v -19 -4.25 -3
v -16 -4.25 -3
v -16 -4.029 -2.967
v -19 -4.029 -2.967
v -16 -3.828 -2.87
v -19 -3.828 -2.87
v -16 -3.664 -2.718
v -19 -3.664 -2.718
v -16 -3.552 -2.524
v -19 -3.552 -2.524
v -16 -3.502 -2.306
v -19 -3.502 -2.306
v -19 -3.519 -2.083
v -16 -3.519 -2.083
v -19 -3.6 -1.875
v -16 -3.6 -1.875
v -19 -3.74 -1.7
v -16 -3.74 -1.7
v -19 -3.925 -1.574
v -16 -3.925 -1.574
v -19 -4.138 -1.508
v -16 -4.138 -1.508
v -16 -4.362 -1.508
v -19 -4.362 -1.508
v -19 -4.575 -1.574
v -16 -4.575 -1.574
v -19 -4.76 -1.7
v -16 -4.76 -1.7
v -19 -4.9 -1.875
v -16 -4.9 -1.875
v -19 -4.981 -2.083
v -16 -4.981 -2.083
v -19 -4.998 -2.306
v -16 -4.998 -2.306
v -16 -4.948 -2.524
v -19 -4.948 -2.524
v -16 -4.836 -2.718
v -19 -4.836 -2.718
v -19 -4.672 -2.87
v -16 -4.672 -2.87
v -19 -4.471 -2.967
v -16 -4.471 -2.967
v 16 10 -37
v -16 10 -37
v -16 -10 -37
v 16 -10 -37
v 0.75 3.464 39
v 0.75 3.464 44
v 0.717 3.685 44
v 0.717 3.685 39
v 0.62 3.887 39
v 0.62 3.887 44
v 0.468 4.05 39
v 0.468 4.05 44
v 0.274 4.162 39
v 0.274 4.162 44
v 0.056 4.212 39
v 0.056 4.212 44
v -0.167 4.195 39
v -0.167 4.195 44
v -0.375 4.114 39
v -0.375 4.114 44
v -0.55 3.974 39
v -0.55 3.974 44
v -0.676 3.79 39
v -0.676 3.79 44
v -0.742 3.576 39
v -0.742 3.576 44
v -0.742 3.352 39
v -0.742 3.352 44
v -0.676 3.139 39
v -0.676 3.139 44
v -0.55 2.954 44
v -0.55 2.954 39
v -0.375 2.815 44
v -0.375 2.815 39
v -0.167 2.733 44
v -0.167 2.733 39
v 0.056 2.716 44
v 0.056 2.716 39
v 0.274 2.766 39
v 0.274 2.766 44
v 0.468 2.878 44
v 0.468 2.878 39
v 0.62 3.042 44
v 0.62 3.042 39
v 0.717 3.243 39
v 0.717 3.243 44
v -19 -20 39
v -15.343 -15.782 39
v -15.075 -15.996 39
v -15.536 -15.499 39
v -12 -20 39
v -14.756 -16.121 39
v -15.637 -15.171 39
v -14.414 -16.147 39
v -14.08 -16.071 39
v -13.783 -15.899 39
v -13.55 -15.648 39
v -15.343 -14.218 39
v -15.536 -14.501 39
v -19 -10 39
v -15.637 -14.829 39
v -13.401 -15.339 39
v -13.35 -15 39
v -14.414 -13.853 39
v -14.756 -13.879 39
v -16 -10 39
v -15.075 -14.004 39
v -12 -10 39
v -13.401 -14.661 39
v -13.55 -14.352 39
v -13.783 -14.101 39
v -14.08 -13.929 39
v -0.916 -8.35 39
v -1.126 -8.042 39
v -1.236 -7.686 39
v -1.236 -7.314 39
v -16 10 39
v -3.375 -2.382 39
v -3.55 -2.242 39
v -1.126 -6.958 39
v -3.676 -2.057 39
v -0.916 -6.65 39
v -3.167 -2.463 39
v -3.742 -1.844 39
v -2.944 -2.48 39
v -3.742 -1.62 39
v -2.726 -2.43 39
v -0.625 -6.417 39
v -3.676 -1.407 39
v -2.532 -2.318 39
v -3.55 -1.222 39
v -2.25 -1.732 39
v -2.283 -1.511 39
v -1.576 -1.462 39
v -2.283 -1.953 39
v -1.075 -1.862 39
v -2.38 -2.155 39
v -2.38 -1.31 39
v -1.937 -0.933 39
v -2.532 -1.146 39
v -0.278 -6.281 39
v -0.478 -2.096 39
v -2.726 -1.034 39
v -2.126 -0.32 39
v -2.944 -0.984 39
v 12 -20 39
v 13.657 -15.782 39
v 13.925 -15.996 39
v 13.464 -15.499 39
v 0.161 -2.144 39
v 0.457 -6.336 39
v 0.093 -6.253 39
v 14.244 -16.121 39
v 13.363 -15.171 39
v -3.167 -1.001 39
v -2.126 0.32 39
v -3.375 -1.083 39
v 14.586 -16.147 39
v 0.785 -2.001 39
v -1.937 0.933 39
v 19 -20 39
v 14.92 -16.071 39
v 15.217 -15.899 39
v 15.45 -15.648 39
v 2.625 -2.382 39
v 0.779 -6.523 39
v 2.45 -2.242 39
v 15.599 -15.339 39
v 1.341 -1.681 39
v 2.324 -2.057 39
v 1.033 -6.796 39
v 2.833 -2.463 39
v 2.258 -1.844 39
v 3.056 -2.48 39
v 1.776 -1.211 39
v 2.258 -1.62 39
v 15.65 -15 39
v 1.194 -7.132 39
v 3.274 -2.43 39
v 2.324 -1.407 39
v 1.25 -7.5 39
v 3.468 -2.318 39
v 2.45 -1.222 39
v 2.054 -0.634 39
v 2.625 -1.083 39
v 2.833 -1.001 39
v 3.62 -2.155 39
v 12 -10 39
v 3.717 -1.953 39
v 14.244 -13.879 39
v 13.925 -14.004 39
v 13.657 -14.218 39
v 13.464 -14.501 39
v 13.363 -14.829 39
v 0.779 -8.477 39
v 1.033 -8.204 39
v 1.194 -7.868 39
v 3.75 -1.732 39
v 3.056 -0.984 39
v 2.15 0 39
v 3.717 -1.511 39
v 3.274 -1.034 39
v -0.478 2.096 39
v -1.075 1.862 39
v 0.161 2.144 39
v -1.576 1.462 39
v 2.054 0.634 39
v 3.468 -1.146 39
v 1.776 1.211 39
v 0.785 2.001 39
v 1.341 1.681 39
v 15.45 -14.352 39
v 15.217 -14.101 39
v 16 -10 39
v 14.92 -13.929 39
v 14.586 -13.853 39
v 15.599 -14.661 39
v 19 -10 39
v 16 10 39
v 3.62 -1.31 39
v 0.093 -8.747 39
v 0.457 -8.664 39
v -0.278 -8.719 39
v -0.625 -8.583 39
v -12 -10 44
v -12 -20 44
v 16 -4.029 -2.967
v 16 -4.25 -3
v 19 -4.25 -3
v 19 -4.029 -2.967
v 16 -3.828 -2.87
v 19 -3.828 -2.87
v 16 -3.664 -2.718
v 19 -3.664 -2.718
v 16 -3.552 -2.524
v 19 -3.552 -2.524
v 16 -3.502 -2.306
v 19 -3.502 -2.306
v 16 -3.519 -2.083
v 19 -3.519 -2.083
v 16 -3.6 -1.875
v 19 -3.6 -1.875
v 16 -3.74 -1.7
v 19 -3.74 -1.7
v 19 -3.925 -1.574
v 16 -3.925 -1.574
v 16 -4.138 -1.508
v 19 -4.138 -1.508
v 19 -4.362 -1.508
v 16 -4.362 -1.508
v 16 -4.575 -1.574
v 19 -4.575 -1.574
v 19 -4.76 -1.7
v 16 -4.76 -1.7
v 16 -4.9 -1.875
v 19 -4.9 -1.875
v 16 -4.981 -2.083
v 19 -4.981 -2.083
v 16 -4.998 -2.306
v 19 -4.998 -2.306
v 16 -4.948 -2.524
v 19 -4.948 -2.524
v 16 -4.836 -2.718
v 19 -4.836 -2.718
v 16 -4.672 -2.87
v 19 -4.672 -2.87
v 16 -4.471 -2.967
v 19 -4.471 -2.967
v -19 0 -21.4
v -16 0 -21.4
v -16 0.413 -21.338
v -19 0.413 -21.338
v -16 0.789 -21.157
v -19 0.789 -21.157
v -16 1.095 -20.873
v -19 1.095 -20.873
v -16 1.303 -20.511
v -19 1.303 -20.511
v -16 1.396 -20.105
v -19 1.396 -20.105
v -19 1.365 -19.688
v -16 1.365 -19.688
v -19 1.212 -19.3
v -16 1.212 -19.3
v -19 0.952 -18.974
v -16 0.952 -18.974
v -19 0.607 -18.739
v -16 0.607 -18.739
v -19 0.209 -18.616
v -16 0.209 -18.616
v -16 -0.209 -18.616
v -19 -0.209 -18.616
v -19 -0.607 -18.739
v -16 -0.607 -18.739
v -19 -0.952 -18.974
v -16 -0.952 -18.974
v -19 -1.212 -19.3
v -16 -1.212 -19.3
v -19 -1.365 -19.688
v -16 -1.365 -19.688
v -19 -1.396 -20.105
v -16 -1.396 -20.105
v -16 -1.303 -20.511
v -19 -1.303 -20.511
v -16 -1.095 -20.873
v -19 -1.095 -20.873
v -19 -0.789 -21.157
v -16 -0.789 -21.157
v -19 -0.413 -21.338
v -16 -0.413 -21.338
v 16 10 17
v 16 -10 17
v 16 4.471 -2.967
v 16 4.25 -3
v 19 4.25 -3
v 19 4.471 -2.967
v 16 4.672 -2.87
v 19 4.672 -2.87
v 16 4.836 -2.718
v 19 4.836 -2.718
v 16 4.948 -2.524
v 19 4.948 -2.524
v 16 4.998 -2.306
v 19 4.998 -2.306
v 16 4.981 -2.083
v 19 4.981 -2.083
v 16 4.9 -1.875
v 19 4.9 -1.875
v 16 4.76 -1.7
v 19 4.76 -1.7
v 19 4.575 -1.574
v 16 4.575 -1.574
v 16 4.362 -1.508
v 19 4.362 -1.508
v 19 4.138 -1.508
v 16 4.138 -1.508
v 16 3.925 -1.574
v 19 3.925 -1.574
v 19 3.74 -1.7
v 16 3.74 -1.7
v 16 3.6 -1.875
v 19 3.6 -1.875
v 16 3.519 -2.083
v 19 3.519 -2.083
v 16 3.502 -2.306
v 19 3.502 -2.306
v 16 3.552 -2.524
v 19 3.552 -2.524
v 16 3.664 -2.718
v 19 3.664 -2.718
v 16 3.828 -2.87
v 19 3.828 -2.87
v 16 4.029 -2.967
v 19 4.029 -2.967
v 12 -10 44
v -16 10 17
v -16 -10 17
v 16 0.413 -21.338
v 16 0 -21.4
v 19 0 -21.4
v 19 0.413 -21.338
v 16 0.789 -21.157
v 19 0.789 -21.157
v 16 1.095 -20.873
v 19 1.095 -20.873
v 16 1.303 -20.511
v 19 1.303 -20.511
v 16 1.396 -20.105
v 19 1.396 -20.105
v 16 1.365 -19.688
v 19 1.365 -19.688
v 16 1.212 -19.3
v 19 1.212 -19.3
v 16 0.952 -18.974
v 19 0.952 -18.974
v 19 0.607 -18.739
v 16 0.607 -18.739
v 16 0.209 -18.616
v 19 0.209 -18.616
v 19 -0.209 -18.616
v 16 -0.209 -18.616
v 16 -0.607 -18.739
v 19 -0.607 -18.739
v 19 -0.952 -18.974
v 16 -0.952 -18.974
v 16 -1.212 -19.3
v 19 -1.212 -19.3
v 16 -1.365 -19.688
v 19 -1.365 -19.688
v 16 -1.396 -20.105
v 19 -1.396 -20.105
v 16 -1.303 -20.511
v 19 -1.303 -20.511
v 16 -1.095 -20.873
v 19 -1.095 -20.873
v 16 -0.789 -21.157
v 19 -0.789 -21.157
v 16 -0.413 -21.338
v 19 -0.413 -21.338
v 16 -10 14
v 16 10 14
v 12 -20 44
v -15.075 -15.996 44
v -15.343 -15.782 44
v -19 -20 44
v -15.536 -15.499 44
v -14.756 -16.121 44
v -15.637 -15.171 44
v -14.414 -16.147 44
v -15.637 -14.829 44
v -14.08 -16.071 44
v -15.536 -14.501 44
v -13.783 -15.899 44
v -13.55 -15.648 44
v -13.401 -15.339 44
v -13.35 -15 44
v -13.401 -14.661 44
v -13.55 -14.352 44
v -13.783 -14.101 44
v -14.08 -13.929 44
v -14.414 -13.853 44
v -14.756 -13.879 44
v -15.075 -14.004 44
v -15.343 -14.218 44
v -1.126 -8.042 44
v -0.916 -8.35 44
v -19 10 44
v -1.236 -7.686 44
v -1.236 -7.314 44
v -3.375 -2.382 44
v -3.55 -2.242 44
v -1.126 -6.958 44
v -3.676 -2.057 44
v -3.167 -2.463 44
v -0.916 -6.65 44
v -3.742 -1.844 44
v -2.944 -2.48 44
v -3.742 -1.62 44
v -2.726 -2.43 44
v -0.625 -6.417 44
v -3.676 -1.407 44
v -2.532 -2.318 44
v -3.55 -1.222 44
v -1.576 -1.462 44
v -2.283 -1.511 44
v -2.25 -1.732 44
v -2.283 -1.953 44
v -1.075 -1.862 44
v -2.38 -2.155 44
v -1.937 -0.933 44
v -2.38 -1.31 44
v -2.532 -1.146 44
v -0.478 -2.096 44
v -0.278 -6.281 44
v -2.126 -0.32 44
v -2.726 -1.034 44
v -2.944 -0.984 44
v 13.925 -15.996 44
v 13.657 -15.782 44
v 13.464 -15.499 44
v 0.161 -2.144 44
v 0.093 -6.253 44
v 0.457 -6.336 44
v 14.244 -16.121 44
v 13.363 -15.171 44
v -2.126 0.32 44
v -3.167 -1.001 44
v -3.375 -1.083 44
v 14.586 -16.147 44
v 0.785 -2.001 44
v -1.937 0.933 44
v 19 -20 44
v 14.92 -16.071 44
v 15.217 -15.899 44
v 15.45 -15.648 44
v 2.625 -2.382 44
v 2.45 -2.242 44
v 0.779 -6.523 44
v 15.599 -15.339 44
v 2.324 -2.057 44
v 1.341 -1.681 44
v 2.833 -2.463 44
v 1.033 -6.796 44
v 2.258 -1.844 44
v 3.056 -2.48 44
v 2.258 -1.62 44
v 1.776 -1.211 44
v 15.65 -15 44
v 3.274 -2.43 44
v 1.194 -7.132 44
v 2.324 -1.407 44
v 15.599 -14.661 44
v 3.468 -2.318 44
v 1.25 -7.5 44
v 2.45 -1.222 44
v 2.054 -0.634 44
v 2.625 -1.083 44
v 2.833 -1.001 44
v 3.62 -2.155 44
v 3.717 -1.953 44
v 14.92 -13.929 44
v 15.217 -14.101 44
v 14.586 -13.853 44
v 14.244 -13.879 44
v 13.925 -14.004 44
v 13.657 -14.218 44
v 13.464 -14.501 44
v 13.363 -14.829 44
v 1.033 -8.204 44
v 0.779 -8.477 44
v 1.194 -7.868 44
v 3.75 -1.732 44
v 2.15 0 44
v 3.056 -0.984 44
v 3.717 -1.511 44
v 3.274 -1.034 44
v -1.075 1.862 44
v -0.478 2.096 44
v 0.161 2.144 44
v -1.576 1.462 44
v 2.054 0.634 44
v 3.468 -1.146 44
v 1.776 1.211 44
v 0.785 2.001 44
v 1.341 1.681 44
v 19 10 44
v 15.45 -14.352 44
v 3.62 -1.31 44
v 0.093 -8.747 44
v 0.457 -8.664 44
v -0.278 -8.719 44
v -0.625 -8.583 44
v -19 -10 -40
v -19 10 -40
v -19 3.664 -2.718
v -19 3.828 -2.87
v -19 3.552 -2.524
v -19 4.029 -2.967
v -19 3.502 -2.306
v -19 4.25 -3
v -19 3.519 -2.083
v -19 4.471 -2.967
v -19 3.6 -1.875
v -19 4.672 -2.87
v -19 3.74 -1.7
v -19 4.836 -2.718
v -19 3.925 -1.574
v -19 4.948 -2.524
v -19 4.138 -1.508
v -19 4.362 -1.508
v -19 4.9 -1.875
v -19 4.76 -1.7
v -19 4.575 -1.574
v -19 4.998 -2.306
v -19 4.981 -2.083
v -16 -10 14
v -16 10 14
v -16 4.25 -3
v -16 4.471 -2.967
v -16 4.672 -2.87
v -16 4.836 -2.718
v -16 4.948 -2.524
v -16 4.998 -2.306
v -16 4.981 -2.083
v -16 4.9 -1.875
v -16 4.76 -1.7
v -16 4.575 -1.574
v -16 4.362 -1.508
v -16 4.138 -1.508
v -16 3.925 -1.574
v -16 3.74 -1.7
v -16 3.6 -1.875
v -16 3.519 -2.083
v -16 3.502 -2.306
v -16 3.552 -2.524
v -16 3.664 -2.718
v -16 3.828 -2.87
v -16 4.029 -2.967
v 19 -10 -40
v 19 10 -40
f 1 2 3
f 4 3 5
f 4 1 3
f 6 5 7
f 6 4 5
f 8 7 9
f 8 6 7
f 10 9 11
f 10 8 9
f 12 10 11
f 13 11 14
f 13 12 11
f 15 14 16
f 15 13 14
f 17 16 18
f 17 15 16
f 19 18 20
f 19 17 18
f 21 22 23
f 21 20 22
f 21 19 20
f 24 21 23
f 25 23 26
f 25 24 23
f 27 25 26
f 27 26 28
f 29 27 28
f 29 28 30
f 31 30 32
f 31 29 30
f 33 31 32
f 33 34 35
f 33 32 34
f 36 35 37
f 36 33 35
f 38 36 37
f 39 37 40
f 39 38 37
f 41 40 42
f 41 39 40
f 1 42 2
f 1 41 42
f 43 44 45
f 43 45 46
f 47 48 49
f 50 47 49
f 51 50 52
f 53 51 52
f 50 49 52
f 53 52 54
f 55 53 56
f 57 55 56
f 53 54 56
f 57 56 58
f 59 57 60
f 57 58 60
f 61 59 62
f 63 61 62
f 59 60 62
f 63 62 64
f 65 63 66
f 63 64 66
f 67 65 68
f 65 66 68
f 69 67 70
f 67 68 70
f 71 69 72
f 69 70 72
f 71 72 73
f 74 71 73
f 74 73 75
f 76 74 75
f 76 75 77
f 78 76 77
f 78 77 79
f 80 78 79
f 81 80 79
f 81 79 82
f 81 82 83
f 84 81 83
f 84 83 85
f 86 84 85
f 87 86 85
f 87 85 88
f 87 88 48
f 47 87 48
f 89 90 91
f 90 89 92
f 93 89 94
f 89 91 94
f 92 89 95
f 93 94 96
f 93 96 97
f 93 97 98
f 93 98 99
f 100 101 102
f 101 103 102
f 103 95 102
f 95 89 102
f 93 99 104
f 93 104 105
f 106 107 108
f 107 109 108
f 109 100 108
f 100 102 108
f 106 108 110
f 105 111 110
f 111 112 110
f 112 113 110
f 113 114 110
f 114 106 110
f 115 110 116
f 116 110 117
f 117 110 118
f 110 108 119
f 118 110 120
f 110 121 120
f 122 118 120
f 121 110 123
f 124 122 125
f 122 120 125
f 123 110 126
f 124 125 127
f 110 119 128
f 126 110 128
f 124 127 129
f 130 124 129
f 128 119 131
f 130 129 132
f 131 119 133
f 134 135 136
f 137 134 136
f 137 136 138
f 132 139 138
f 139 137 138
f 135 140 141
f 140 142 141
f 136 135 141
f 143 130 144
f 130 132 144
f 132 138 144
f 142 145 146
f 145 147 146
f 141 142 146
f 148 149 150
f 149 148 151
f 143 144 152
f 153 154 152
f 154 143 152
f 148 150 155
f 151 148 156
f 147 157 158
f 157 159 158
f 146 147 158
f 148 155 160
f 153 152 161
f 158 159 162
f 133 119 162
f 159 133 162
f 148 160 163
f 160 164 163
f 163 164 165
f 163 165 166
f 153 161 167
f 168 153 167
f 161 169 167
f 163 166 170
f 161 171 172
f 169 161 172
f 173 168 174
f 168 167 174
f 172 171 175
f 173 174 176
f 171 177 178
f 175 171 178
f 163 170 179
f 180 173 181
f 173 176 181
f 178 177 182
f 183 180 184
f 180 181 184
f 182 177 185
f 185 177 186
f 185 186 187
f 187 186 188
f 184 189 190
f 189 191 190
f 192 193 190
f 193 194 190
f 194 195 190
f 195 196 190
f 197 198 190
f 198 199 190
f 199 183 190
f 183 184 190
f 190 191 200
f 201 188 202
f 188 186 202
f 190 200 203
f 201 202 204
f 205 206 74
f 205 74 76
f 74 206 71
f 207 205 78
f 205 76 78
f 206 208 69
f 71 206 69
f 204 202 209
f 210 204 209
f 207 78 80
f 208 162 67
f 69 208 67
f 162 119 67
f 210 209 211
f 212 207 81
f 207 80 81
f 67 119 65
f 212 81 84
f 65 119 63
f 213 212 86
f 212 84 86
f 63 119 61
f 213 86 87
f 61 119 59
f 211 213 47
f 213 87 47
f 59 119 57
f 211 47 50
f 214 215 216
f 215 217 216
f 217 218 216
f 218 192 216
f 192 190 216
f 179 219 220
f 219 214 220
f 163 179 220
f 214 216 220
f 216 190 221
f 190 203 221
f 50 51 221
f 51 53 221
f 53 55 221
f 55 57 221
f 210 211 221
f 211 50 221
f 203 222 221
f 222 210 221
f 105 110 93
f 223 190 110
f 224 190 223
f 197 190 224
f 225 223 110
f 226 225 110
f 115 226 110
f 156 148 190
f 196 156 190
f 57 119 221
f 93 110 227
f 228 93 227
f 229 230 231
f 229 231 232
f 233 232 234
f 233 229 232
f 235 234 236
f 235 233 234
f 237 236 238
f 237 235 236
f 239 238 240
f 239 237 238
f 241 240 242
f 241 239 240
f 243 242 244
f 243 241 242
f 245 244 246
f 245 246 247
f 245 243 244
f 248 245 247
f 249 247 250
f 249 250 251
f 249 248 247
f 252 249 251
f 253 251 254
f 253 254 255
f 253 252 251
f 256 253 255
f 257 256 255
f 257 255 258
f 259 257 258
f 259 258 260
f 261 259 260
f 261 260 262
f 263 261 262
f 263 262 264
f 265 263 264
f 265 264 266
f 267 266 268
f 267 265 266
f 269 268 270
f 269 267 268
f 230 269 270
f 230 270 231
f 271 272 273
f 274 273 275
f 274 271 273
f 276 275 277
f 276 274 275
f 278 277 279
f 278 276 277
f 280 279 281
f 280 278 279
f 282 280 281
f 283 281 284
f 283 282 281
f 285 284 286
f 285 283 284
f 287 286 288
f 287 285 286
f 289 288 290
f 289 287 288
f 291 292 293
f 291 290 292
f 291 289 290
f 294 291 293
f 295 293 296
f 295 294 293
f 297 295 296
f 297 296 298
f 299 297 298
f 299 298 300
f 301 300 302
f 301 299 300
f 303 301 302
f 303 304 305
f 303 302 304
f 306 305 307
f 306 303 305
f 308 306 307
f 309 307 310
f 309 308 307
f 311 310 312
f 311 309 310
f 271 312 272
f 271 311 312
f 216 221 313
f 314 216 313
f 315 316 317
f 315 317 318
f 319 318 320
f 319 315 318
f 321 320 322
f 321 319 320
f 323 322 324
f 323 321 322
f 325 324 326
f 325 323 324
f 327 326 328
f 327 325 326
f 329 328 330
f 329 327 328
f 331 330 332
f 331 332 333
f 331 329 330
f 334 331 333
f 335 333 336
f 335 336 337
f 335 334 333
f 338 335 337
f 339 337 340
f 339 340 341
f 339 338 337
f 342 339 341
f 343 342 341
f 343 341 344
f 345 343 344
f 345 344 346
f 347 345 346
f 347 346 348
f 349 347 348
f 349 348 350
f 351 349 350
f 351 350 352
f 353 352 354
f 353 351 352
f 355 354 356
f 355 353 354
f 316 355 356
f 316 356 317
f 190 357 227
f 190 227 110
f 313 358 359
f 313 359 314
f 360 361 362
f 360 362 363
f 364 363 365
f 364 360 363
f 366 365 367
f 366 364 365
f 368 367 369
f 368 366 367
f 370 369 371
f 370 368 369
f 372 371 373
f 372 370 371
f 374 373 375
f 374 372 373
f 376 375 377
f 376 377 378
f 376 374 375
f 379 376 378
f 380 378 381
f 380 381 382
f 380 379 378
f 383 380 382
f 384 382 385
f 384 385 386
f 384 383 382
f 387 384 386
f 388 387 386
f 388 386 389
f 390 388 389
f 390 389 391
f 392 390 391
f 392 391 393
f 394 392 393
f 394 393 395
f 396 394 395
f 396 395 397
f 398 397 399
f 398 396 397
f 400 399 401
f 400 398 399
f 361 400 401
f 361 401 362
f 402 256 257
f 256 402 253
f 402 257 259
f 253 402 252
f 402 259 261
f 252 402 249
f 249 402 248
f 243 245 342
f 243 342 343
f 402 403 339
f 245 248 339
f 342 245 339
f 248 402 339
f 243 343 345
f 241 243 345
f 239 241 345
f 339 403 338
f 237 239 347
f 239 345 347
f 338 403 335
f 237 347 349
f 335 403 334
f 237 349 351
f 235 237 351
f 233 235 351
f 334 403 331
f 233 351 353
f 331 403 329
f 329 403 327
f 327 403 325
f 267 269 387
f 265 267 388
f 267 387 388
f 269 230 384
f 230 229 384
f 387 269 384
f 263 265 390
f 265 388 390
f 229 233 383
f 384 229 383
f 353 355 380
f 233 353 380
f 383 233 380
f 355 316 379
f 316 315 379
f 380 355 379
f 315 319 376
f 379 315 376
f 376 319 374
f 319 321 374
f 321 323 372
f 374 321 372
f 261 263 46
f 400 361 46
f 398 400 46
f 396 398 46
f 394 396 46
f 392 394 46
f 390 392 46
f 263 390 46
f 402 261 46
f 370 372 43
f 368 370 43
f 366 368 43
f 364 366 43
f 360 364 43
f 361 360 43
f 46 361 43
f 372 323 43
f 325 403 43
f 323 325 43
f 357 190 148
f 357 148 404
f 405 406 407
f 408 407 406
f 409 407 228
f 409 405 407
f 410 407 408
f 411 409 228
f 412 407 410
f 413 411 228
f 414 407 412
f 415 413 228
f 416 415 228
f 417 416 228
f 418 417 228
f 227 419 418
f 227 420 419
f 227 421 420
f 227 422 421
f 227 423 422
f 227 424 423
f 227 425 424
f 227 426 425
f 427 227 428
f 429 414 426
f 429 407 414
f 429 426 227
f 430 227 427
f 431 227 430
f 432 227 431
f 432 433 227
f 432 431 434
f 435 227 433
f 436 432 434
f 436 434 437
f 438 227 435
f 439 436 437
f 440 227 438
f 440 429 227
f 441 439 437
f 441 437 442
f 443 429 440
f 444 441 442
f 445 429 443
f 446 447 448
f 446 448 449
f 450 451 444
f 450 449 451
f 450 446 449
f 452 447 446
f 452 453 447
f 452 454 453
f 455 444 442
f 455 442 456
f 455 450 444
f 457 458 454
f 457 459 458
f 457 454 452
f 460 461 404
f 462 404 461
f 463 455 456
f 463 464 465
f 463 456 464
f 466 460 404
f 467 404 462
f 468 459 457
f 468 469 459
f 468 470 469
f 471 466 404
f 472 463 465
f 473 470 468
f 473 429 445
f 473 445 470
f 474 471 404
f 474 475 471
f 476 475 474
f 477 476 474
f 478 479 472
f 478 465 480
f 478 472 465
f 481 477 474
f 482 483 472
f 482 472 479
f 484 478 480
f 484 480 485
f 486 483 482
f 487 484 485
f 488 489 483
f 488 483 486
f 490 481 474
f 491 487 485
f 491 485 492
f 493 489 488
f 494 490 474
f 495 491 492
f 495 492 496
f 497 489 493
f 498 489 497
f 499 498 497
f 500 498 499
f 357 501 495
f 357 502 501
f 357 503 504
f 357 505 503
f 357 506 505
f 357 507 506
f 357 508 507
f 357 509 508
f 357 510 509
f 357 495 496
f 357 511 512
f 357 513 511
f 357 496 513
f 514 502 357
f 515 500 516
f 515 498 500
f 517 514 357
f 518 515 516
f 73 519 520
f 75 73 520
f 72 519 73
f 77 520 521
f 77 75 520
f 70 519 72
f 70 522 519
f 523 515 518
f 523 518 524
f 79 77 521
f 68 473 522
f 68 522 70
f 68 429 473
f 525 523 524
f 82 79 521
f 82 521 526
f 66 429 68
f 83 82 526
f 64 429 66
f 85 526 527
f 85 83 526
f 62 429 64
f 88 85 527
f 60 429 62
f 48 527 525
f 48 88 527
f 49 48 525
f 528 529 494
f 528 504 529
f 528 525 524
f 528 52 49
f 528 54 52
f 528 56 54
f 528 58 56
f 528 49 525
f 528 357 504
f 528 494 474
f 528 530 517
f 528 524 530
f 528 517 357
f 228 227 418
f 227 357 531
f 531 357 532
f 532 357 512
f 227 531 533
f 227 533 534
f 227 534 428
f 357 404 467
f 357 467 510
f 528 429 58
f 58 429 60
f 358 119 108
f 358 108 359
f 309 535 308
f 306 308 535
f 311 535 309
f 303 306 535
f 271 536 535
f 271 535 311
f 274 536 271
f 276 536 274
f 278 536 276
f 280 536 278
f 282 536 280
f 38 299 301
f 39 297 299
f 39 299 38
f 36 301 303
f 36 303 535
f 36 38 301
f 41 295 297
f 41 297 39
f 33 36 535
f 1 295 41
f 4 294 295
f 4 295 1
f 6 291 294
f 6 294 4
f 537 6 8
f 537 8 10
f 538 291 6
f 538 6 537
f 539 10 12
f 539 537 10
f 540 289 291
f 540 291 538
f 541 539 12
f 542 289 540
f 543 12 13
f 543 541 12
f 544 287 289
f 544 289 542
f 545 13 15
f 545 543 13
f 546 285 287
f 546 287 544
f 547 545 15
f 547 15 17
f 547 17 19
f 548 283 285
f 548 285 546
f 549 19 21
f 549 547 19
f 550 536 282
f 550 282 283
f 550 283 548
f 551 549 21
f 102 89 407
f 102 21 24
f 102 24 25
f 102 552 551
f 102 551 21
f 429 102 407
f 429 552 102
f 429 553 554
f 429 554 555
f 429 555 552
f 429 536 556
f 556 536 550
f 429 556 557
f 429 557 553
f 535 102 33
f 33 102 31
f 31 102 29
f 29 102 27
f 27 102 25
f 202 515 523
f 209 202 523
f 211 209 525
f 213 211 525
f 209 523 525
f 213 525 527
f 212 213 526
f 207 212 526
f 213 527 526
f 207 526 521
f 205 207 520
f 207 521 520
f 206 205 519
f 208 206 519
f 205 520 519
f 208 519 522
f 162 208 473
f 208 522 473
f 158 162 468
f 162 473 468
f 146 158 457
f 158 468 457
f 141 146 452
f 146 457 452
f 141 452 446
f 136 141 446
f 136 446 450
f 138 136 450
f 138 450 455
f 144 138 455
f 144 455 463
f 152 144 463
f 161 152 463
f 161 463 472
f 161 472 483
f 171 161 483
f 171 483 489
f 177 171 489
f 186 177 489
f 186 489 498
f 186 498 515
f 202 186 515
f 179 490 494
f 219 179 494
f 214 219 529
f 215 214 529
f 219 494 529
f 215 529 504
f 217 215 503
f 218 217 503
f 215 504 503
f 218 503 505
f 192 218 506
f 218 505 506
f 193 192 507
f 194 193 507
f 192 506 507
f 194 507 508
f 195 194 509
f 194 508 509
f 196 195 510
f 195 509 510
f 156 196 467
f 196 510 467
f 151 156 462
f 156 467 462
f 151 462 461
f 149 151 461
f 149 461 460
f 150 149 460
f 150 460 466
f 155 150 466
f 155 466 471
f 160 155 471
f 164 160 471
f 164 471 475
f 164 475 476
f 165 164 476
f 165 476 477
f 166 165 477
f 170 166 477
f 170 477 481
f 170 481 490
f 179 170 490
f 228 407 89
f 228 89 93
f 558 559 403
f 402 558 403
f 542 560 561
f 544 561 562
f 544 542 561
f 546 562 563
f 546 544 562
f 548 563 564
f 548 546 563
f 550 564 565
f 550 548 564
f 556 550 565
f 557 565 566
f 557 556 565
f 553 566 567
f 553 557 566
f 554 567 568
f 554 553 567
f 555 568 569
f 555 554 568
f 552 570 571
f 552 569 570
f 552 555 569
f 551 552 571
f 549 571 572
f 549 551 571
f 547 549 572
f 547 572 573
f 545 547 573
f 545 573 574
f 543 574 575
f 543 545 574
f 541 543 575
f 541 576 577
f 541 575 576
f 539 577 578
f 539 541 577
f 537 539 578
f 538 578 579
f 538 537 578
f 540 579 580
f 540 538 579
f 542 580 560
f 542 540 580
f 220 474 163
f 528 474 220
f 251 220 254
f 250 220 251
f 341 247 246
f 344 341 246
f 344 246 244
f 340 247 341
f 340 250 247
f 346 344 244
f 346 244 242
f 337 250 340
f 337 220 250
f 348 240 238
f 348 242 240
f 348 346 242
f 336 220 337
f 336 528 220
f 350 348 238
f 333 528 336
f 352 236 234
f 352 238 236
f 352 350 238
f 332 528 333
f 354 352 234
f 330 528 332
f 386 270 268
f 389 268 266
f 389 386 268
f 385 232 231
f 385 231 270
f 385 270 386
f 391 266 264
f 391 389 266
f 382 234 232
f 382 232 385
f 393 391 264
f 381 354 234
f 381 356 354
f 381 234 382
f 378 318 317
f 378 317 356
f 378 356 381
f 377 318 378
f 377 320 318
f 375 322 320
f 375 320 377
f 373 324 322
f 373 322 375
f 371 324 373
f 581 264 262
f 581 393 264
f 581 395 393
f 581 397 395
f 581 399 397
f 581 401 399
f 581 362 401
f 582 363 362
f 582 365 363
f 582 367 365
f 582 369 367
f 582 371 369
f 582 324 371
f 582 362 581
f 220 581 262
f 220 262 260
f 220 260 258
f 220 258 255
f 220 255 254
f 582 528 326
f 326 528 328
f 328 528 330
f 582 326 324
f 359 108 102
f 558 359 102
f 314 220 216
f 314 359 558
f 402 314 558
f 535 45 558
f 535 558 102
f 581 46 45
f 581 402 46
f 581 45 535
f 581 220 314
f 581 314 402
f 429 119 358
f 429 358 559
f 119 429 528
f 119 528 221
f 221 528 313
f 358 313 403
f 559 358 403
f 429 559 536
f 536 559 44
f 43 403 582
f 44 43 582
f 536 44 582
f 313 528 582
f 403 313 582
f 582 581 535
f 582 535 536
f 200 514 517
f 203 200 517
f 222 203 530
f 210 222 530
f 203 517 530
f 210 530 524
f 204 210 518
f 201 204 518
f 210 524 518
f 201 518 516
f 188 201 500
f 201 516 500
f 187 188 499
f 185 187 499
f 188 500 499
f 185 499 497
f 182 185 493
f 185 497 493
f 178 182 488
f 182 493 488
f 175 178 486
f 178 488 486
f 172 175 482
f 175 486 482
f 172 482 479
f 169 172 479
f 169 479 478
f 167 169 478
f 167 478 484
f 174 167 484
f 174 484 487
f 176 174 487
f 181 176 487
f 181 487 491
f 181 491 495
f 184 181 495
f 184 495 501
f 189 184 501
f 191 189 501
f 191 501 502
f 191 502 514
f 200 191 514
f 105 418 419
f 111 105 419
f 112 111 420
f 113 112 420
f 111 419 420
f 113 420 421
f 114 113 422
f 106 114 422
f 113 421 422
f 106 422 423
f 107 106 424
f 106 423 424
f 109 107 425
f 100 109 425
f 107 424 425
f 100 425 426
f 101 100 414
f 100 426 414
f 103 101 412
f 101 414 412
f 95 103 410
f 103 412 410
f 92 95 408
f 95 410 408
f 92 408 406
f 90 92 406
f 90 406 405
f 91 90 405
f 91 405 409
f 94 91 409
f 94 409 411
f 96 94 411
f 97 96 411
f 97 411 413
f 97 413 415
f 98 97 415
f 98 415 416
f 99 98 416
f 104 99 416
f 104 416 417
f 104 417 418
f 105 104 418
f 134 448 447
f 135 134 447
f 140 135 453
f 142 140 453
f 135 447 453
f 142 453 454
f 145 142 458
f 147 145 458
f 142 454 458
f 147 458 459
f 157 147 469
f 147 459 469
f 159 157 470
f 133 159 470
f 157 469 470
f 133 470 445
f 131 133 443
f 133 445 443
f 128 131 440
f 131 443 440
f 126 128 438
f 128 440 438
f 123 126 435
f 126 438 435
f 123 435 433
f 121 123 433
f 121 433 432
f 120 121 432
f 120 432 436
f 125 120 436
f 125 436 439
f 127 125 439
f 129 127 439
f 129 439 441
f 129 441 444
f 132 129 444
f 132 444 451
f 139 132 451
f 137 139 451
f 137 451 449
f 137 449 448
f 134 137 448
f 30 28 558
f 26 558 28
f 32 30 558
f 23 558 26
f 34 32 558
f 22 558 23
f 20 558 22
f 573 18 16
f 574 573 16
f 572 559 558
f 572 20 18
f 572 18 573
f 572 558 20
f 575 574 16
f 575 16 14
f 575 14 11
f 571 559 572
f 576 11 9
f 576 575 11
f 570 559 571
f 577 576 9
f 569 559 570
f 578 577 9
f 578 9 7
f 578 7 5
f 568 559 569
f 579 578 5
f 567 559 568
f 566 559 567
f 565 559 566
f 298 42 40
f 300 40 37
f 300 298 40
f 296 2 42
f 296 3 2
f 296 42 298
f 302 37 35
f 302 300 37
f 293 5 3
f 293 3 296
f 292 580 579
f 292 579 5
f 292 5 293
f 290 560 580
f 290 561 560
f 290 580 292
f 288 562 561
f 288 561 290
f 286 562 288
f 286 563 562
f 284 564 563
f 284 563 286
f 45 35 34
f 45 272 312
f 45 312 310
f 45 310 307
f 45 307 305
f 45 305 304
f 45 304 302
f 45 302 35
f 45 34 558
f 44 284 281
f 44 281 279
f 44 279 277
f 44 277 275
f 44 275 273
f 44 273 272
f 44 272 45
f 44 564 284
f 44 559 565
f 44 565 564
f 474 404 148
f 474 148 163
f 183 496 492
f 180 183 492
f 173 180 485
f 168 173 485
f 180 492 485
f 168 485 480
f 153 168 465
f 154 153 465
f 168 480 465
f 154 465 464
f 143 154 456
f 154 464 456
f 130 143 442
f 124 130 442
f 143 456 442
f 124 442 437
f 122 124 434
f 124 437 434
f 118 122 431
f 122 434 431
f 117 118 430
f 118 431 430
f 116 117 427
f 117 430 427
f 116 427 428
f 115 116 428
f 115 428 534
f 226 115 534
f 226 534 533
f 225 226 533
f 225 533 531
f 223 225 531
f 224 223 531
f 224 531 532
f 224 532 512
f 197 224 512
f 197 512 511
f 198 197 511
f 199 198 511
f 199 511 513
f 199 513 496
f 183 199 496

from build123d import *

# Parameters (mm, degrees)
ESBO_O2_W                = 84
ESBO_O2_H                = 20
ESBO_O2_R                = 0.75
ESBO_O2_R_2              = 1.4
RESSALTO_EXTRUS_O1_DEPTH = 19
ESBO_O3_W                = 32
ESBO_O3_H                = 51
ESBO_O3_H_2              = 22
CORTE_EXTRUS_O1_DEPTH    = 21
ESBO_O6_W                = 7
ESBO_O6_H                = 5
RESSALTO_EXTRUS_O2_DEPTH = 10
CORTE_EXTRUS_O2_REACH    = 86
ESBO_O4_R                = 0.75
ESBO_O4_R_2              = 1.25
ESBO_O4_R_3              = 2.15
ESBO_O4_R_4              = 1.15


with BuildPart() as part:
    # Esboço2 → Ressalto-extrusão1 (new body, symmetric)
    with BuildSketch(Plane(origin=(0, 0, 0), x_dir=(0, 0, -1), z_dir=(1, 0, 0))):
        with Locations((-2, 0)):
            Rectangle(ESBO_O2_W, ESBO_O2_H)
        with Locations((2.25, 4.25)):
            Circle(ESBO_O2_R, mode=Mode.SUBTRACT)
        with Locations((2.25, -4.25)):
            Circle(ESBO_O2_R, mode=Mode.SUBTRACT)
        with Locations((20, 0)):
            Circle(ESBO_O2_R_2, mode=Mode.SUBTRACT)
    extrude(amount=RESSALTO_EXTRUS_O1_DEPTH, both=True)

    # Esboço3 → Corte-extrusão1 (cut, through all)
    with BuildSketch(Plane(origin=(0, 10, 0), x_dir=(1, 0, 0), z_dir=(0, 1, 0))):
        with Locations((0, 11.5)):
            Rectangle(ESBO_O3_W, ESBO_O3_H)
        with Locations((0, -28)):
            Rectangle(ESBO_O3_W, ESBO_O3_H_2)
    extrude(amount=-CORTE_EXTRUS_O1_DEPTH, mode=Mode.SUBTRACT)

    # Esboço6 → Ressalto-extrusão2 (add)
    with BuildSketch(Plane.XZ.offset(10)):
        with Locations((-15.5, 41.5)):
            Rectangle(ESBO_O6_W, ESBO_O6_H)
        with Locations((15.5, 41.5)):
            Rectangle(ESBO_O6_W, ESBO_O6_H)
    extrude(amount=RESSALTO_EXTRUS_O2_DEPTH)

    # Esboço4 → Corte-extrusão2 (cut, up to next)
    with BuildSketch(Plane.XY.offset(44), mode=Mode.PRIVATE) as corte_extrus_o2_sk1:
        with Locations((0, 3.464101615)):
            Circle(ESBO_O4_R)
    corte_extrus_o2_tool1 = extrude(corte_extrus_o2_sk1.sketch, amount=-CORTE_EXTRUS_O2_REACH, mode=Mode.PRIVATE) & part.part
    add(corte_extrus_o2_tool1.solids().sort_by_distance((0, 3.464102, 44))[0], mode=Mode.SUBTRACT)
    # Esboço4 → Corte-extrusão2 (cut, up to next)
    with BuildSketch(Plane.XY.offset(44), mode=Mode.PRIVATE) as corte_extrus_o2_sk2:
        with Locations((3, -1.732050808)):
            Circle(ESBO_O4_R)
    corte_extrus_o2_tool2 = extrude(corte_extrus_o2_sk2.sketch, amount=-CORTE_EXTRUS_O2_REACH, mode=Mode.PRIVATE) & part.part
    add(corte_extrus_o2_tool2.solids().sort_by_distance((3, -1.732051, 44))[0], mode=Mode.SUBTRACT)
    # Esboço4 → Corte-extrusão2 (cut, up to next)
    with BuildSketch(Plane.XY.offset(44), mode=Mode.PRIVATE) as corte_extrus_o2_sk3:
        with Locations((-3, -1.732050808)):
            Circle(ESBO_O4_R)
    corte_extrus_o2_tool3 = extrude(corte_extrus_o2_sk3.sketch, amount=-CORTE_EXTRUS_O2_REACH, mode=Mode.PRIVATE) & part.part
    add(corte_extrus_o2_tool3.solids().sort_by_distance((-3, -1.732051, 44))[0], mode=Mode.SUBTRACT)
    # Esboço4 → Corte-extrusão2 (cut, up to next)
    with BuildSketch(Plane.XY.offset(44), mode=Mode.PRIVATE) as corte_extrus_o2_sk4:
        with Locations((0, -7.5)):
            Circle(ESBO_O4_R_2)
    corte_extrus_o2_tool4 = extrude(corte_extrus_o2_sk4.sketch, amount=-CORTE_EXTRUS_O2_REACH, mode=Mode.PRIVATE) & part.part
    add(corte_extrus_o2_tool4.solids().sort_by_distance((0, -7.5, 44))[0], mode=Mode.SUBTRACT)
    # Esboço4 → Corte-extrusão2 (cut, up to next)
    with BuildSketch(Plane.XY.offset(44), mode=Mode.PRIVATE) as corte_extrus_o2_sk5:
        Circle(ESBO_O4_R_3)
    corte_extrus_o2_tool5 = extrude(corte_extrus_o2_sk5.sketch, amount=-CORTE_EXTRUS_O2_REACH, mode=Mode.PRIVATE) & part.part
    add(corte_extrus_o2_tool5.solids().sort_by_distance((0, 0, 44))[0], mode=Mode.SUBTRACT)
    # Esboço4 → Corte-extrusão2 (cut, up to next)
    with BuildSketch(Plane.XY.offset(44), mode=Mode.PRIVATE) as corte_extrus_o2_sk6:
        with Locations((-14.5, -15)):
            Circle(ESBO_O4_R_4)
    corte_extrus_o2_tool6 = extrude(corte_extrus_o2_sk6.sketch, amount=-CORTE_EXTRUS_O2_REACH, mode=Mode.PRIVATE) & part.part
    add(corte_extrus_o2_tool6.solids().sort_by_distance((-14.5, -15, 44))[0], mode=Mode.SUBTRACT)
    # Esboço4 → Corte-extrusão2 (cut, up to next)
    with BuildSketch(Plane.XY.offset(44), mode=Mode.PRIVATE) as corte_extrus_o2_sk7:
        with Locations((14.5, -15)):
            Circle(ESBO_O4_R_4)
    corte_extrus_o2_tool7 = extrude(corte_extrus_o2_sk7.sketch, amount=-CORTE_EXTRUS_O2_REACH, mode=Mode.PRIVATE) & part.part
    add(corte_extrus_o2_tool7.solids().sort_by_distance((14.5, -15, 44))[0], mode=Mode.SUBTRACT)


solid = part.part
